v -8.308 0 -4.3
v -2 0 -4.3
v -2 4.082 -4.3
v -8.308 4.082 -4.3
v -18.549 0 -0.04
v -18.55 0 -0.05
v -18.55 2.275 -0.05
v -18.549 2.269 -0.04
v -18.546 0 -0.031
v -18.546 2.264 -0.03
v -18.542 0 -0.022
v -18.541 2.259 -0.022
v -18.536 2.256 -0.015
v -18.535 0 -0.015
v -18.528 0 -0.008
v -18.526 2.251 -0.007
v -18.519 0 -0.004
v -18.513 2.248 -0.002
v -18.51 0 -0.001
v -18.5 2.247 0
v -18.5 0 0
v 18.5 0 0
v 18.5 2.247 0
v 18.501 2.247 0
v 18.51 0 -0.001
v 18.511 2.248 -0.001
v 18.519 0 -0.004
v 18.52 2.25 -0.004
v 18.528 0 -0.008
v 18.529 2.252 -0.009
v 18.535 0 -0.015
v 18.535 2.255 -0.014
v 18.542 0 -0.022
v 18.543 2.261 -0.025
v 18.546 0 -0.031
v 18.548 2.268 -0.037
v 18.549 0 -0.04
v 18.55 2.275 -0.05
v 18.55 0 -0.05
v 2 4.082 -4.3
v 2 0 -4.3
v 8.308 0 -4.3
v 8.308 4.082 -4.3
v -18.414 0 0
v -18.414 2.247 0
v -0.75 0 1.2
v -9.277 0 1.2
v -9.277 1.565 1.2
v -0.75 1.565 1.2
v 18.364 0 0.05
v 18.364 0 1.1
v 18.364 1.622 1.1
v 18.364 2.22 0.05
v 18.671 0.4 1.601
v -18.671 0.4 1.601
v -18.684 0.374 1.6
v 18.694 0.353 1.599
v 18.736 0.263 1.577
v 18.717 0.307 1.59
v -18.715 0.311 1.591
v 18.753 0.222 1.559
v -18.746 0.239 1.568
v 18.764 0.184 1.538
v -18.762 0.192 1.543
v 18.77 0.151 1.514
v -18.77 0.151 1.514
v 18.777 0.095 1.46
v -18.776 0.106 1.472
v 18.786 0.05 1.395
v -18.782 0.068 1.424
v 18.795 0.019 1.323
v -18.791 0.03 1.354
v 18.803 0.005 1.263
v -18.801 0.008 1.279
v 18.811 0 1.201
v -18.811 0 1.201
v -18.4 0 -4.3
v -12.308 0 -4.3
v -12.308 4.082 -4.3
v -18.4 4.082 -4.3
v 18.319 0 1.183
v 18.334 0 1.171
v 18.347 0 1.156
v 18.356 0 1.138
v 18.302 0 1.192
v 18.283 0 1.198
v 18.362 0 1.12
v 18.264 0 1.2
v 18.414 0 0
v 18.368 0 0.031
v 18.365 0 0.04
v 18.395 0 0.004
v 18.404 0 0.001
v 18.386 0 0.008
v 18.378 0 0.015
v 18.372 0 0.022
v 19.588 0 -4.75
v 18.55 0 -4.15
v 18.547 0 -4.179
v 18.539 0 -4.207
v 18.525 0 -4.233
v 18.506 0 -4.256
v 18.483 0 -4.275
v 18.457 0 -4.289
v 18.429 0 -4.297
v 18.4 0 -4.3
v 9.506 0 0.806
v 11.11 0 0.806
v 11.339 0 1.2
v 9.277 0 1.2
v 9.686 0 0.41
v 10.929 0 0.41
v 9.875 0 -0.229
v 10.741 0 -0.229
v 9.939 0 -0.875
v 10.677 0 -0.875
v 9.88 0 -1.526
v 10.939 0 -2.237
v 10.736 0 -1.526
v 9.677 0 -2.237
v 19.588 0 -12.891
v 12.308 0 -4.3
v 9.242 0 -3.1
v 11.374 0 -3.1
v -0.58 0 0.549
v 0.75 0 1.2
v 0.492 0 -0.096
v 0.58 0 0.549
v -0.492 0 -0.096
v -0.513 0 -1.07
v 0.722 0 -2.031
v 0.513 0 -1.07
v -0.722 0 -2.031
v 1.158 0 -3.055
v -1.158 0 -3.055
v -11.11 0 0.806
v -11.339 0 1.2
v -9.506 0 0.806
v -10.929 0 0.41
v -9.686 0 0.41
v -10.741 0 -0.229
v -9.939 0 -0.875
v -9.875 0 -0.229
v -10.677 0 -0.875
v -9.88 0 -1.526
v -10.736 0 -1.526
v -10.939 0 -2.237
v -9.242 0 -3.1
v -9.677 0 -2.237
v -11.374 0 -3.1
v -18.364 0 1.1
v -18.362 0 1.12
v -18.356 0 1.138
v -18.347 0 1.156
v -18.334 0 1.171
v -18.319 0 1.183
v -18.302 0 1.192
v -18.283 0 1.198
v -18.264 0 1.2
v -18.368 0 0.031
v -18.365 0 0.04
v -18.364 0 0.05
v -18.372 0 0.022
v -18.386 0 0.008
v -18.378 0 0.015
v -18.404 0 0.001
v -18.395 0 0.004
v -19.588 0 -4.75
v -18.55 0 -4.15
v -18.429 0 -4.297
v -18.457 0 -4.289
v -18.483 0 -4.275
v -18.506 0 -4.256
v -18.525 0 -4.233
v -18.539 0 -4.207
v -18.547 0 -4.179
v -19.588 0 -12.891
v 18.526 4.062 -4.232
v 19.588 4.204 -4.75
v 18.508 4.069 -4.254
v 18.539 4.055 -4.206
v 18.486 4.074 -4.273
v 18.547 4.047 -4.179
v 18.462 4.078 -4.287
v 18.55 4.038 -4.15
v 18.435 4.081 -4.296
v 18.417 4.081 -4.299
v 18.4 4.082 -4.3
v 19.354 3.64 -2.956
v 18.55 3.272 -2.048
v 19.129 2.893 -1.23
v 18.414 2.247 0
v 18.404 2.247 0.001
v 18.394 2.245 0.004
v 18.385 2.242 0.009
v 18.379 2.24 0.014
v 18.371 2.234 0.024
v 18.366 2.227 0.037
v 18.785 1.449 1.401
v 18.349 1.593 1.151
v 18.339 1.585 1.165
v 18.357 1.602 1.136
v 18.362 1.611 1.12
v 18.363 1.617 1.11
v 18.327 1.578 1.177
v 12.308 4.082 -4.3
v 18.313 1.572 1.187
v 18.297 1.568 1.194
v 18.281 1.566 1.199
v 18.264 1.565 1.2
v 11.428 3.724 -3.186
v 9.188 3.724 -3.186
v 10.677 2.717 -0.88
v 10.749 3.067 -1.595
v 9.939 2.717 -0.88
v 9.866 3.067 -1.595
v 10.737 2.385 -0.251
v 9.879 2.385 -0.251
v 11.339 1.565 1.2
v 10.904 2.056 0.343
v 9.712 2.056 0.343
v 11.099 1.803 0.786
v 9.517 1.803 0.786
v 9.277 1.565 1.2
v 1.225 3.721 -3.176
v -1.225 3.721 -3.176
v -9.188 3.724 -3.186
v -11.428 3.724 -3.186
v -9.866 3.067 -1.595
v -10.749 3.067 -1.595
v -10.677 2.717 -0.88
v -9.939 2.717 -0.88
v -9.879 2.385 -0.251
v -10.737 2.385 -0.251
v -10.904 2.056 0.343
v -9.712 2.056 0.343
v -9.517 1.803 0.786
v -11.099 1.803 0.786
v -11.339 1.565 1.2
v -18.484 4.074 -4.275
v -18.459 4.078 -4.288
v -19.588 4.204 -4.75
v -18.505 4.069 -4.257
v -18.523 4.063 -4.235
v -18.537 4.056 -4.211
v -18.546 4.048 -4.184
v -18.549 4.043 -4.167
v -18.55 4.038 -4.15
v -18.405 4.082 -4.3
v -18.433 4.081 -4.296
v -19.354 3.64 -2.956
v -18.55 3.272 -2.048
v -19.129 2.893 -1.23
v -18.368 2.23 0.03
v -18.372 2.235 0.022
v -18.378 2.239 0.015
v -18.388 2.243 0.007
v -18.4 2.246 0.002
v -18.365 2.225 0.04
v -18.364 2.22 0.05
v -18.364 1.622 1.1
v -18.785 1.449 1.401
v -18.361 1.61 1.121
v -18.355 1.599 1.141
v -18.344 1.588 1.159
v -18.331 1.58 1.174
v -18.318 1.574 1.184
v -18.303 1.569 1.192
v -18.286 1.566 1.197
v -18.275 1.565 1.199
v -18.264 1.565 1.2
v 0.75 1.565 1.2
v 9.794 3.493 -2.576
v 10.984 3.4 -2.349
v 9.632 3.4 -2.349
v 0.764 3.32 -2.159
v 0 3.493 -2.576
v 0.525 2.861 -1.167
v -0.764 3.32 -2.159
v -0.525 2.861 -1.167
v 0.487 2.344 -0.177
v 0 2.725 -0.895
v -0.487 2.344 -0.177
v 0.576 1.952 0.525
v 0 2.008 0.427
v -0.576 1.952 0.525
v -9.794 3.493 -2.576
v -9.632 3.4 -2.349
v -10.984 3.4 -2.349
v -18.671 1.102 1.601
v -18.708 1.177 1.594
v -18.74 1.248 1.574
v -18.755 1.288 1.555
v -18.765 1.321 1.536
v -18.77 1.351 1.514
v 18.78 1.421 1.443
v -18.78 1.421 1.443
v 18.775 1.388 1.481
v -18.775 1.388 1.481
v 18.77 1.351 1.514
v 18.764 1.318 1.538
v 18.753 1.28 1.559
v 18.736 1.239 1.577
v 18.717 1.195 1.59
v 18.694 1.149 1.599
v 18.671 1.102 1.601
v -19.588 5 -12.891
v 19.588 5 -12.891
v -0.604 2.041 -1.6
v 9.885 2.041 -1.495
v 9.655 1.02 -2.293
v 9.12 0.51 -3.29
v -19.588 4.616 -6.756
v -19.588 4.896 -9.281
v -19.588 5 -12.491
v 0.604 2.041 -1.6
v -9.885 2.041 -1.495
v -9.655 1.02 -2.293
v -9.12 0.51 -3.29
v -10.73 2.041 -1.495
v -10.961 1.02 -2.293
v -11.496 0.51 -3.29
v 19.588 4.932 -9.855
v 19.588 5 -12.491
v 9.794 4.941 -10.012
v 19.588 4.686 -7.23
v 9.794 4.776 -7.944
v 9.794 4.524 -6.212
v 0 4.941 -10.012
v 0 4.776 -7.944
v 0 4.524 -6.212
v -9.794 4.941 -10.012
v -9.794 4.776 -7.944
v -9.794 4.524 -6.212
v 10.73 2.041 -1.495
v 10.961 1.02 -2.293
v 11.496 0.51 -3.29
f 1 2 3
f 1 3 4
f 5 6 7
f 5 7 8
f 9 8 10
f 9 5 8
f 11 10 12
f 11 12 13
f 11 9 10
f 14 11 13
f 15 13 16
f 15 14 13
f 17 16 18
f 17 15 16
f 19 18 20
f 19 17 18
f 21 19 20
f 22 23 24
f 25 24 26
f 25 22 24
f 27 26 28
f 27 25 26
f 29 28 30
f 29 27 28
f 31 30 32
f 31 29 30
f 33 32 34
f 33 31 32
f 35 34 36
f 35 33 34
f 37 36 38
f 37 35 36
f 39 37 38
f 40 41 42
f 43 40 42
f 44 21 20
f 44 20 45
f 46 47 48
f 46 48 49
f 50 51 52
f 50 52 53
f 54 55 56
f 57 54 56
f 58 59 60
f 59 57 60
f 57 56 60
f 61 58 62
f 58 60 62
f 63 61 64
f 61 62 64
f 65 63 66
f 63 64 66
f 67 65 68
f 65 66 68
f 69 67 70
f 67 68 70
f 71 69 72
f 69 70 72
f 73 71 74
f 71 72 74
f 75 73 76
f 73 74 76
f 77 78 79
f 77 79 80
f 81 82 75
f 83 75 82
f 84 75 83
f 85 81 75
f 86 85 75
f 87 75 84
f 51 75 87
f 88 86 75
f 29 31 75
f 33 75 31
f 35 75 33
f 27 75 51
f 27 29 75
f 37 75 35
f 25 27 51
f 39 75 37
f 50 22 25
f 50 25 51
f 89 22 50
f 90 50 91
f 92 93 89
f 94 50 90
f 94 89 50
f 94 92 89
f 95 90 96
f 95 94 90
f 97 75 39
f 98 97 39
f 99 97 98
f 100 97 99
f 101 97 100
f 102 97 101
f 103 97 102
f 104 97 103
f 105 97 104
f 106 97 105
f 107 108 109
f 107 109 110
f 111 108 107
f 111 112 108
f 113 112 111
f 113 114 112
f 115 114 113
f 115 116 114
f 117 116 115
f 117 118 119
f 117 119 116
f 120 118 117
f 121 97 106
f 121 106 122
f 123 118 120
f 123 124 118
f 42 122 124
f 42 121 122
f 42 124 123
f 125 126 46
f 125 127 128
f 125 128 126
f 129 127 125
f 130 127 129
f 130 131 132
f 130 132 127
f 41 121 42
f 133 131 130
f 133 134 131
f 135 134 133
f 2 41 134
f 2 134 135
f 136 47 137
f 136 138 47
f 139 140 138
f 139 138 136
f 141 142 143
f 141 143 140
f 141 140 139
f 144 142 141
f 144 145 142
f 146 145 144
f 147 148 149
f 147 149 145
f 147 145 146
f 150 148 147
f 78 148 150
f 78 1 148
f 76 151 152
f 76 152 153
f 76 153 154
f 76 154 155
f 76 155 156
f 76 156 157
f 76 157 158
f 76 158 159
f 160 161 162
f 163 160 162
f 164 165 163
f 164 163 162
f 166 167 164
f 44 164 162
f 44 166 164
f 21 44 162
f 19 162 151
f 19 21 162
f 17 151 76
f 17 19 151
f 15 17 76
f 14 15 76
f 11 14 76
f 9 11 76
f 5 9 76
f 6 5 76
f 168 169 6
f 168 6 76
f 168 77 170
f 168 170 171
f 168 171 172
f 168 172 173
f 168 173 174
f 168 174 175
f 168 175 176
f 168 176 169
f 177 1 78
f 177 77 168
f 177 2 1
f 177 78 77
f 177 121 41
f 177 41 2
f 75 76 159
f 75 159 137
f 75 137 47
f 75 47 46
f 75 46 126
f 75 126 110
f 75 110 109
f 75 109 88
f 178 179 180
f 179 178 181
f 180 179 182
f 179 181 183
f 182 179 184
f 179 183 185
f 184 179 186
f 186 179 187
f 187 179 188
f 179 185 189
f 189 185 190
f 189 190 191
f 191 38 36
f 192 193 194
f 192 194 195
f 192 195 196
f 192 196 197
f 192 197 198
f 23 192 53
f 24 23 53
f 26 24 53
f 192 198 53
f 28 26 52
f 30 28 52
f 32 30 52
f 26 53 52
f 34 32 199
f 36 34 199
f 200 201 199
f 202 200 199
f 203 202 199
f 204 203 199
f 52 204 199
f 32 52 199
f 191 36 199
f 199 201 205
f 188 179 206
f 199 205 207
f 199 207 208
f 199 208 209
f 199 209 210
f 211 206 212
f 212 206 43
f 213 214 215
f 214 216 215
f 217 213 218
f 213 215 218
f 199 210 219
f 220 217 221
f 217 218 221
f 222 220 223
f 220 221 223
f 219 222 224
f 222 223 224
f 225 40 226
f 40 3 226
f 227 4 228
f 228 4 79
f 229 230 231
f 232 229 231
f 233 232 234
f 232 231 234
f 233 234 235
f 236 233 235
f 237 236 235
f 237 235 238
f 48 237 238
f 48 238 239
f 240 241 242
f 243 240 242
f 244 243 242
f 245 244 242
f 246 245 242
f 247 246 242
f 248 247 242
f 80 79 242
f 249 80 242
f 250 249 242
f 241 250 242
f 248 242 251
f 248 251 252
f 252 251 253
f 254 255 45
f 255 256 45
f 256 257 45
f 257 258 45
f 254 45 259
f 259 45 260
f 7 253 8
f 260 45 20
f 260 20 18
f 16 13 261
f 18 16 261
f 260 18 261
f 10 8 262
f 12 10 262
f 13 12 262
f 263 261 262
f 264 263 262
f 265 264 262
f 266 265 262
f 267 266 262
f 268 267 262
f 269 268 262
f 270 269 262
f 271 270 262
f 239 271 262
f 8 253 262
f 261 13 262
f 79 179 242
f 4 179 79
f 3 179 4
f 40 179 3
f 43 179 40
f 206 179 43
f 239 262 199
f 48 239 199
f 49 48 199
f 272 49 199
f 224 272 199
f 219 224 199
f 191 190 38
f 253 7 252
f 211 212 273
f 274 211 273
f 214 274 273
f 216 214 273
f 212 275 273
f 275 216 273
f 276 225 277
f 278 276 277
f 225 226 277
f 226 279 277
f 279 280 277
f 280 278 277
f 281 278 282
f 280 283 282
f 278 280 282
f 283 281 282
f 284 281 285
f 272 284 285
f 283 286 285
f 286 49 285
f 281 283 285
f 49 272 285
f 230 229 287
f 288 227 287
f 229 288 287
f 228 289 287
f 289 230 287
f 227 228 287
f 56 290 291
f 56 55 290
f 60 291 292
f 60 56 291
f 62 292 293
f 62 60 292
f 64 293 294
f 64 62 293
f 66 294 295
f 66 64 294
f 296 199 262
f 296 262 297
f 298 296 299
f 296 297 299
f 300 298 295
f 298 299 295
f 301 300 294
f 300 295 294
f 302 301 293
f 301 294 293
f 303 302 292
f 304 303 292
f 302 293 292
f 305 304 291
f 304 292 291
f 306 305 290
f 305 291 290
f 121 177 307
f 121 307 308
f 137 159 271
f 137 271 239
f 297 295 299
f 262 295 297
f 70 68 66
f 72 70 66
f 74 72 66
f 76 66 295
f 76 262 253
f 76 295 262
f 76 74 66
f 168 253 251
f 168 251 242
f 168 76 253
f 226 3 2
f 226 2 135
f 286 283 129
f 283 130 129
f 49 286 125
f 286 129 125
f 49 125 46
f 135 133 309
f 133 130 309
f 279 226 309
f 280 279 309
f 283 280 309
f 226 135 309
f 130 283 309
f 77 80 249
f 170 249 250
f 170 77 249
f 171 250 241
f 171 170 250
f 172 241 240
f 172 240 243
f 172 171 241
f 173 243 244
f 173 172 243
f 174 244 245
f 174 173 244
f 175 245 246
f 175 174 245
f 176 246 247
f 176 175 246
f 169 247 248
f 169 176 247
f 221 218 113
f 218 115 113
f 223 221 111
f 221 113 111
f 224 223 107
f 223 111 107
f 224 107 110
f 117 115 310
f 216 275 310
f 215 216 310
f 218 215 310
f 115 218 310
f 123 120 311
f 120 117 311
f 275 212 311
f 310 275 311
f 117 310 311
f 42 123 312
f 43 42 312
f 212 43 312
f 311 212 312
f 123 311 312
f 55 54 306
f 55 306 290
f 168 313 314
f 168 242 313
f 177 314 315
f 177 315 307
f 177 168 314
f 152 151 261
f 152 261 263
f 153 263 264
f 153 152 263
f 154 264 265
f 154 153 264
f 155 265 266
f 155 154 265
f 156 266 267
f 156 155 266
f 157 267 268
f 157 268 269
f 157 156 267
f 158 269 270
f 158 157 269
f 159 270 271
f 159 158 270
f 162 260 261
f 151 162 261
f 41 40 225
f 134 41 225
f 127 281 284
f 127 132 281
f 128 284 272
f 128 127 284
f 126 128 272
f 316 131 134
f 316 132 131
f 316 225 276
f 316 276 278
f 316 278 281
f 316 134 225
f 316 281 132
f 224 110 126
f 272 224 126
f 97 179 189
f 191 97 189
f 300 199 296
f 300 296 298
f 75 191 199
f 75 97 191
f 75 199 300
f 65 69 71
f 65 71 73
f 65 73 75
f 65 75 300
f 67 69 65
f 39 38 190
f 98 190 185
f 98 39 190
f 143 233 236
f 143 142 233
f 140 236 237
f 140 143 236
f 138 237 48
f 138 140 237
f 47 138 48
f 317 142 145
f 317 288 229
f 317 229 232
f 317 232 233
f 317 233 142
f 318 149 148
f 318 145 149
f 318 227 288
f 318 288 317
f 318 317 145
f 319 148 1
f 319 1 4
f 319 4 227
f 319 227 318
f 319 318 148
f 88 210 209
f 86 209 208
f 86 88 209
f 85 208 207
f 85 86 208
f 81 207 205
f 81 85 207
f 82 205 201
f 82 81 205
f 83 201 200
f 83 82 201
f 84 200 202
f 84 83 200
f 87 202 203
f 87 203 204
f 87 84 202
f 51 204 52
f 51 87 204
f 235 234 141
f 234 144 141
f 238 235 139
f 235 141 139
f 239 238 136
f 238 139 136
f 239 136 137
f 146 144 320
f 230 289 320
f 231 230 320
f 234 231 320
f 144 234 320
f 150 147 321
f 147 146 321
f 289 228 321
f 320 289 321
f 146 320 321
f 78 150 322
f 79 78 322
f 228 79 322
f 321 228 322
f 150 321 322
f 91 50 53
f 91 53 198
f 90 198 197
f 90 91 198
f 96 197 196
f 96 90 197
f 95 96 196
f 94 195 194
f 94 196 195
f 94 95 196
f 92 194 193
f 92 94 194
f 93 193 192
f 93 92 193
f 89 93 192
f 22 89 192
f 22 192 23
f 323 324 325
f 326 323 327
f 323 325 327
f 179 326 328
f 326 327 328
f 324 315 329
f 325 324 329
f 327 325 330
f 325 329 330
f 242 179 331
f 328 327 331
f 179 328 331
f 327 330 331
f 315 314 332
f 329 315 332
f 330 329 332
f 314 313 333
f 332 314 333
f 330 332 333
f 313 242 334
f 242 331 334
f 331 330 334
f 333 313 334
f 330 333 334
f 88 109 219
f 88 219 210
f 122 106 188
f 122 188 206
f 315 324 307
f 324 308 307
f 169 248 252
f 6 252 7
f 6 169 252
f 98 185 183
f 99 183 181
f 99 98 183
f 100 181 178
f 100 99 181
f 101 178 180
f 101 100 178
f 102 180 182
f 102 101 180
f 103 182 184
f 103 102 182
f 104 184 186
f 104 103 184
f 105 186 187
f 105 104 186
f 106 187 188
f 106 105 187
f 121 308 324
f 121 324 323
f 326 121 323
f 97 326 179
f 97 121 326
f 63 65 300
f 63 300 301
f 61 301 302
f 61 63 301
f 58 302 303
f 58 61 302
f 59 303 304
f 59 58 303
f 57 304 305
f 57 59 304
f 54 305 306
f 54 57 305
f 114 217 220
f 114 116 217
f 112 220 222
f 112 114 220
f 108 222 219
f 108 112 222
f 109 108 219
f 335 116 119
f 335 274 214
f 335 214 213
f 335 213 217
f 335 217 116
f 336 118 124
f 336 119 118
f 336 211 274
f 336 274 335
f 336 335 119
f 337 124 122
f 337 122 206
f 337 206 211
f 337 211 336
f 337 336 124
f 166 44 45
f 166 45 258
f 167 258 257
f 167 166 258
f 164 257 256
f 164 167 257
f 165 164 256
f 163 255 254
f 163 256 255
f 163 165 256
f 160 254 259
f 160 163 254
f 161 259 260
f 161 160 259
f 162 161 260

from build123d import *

# Parameters (mm, degrees)
BOSS_EXTRUDE1_DEPTH = 5
SKETCH5_W           = 39.175778664
SKETCH5_H           = 11.134274613
CUT_REVOLVE3_ANGLE  = 30
CUT_EXTRUDE2_DEPTH  = 50


with BuildPart() as part:
    # Sketch2 → Boss-Extrude1 (new body)
    with BuildSketch(Plane(origin=(0, 0, 0), x_dir=(1, 0, 0), z_dir=(0, 1, 0))):
        with BuildLine():
            Line((-19.587889332, 4.75), (-19.587889332, 12.891151468))
            Line((-19.587889332, 12.891151468), (19.587889332, 12.891151468))
            Line((19.587889332, 12.891151468), (19.587889332, 4.75))
            Line((19.587889332, 4.75), (18.770336665, -1.514246746))
            ThreePointArc((18.770336665, -1.514246746), (18.737154352, -1.576452374), (18.671177592, -1.601305403))
            Line((18.671177592, -1.601305403), (-18.671177592, -1.601305403))
            ThreePointArc((-18.671177592, -1.601305403), (-18.737154352, -1.576452374), (-18.770336665, -1.514246746))
            Line((-18.770336665, -1.514246746), (-19.587889332, 4.75))
        make_face()
        with BuildLine():
            Line((18.41371442, 0), (18.5, 0))
            ThreePointArc((18.5, 0), (18.535355339, 0.014644661), (18.55, 0.05))
            Line((18.55, 0.05), (18.55, 4.15))
            ThreePointArc((18.55, 4.15), (18.506066017, 4.256066017), (18.4, 4.3))
            Line((18.4, 4.3), (12.307916791, 4.3))
            add(Edge.make_bspline(
                [(12.307916791, 4.3), (9.637425056, 1.440271055), (11.338639539, -1.2)],
                knots=[0, 0, 0, 1, 1, 1], degree=2))
            Line((11.338639539, -1.2), (18.26371442, -1.2))
            ThreePointArc((18.26371442, -1.2), (18.334425098, -1.170710678), (18.36371442, -1.1))
            Line((18.36371442, -1.1), (18.36371442, -0.05))
            ThreePointArc((18.36371442, -0.05), (18.378359081, -0.014644661), (18.41371442, 0))
        make_face(mode=Mode.SUBTRACT)
        with BuildLine():
            Line((-2, 4.3), (-8.307916791, 4.3))
            add(Edge.make_bspline(
                [(-8.307916791, 4.3), (-10.978408526, 1.440271055), (-9.277194043, -1.2)],
                knots=[0, 0, 0, 1, 1, 1], degree=2))
            Line((-9.277194043, -1.2), (-0.75, -1.2))
            add(Edge.make_bspline(
                [(-2, 4.3), (0.166282415, 1.650512873), (-0.75, -1.2)],
                knots=[0, 0, 0, 1, 1, 1], degree=2))
        make_face(mode=Mode.SUBTRACT)
        with BuildLine():
            Line((9.277194043, -1.2), (0.75, -1.2))
            add(Edge.make_bspline(
                [(2, 4.3), (-0.166282415, 1.650512873), (0.75, -1.2)],
                knots=[0, 0, 0, 1, 1, 1], degree=2))
            Line((2, 4.3), (8.307916791, 4.3))
            add(Edge.make_bspline(
                [(8.307916791, 4.3), (10.978408526, 1.440271055), (9.277194043, -1.2)],
                knots=[0, 0, 0, 1, 1, 1], degree=2))
        make_face(mode=Mode.SUBTRACT)
        with BuildLine():
            Line((-12.307916791, 4.3), (-18.4, 4.3))
            ThreePointArc((-18.4, 4.3), (-18.506066017, 4.256066017), (-18.55, 4.15))
            Line((-18.55, 4.15), (-18.55, 0.05))
            ThreePointArc((-18.55, 0.05), (-18.535355339, 0.014644661), (-18.5, 0))
            Line((-18.5, 0), (-18.41371442, 0))
            ThreePointArc((-18.41371442, 0), (-18.378359081, -0.014644661), (-18.36371442, -0.05))
            Line((-18.36371442, -0.05), (-18.36371442, -1.1))
            ThreePointArc((-18.36371442, -1.1), (-18.334425098, -1.170710678), (-18.26371442, -1.2))
            Line((-18.26371442, -1.2), (-11.338639539, -1.2))
            add(Edge.make_bspline(
                [(-12.307916791, 4.3), (-9.637425056, 1.440271055), (-11.338639539, -1.2)],
                knots=[0, 0, 0, 1, 1, 1], degree=2))
        make_face(mode=Mode.SUBTRACT)
    extrude(amount=BOSS_EXTRUDE1_DEPTH)

    # Sketch5 → Cut-Revolve3 (revolve, cut)
    with BuildSketch(Plane(origin=(0, 5, 0), x_dir=(1, 0, 0), z_dir=(0, 1, 0))):
        with Locations((0, -0.817137307)):
            Rectangle(SKETCH5_W, SKETCH5_H)
    revolve(axis=Axis((-19.587889332, 5, -4.75), (1, 0, 0)), revolution_arc=CUT_REVOLVE3_ANGLE, mode=Mode.SUBTRACT)

    # Sketch8 → Cut-Extrude2 (cut)
    with BuildSketch(Plane.ZY.offset(19.587889332)):
        Polygon((4.230476996, 7.111214782), (-14.213063749, 7.925673134), (-16.866621606, -3.135196744), (3.547382894, -3.844563695), align=None)
        with BuildLine():
            Line((-12.891151468, 0), (-12.891151468, 0.4))
            Line((-12.891151468, 0.4), (-12.891151468, 4.6))
            Line((-12.891151468, 4.6), (-12.891151468, 5))
            Line((-12.891151468, 5), (-12.491151468, 5))
            Line((-12.491151468, 5), (-4.75, 5))
            Line((-4.75, 5), (-4.75, 4.203963132))
            add(Edge.make_bspline(
                [(-4.75, 4.203963132), (-2.254573222, 3.559264678), (-0.743625983, 2.686918883), (0.627090158, 1.89553555), (1.401305403, 1.448542169)],
                knots=[0.350361042, 0.350361042, 0.350361042, 0.350361042, 0.350361042, 1, 1, 1, 1, 1], degree=4))
            ThreePointArc((1.401305403, 1.448542169), (1.547715565, 1.302132008), (1.601305403, 1.102132008))
            Line((1.601305403, 1.102132008), (1.601305403, 0.4))
            ThreePointArc((1.601305403, 0.4), (1.484148116, 0.117157288), (1.201305403, 0))
            Line((1.201305403, 0), (-4.75, 0))
            Line((-4.75, 0), (-12.491151468, 0))
            Line((-12.491151468, 0), (-12.891151468, 0))
        make_face(mode=Mode.SUBTRACT)
        with BuildLine():
            Line((-4.75, 5), (-12.491151468, 5))
            add(Edge.make_bspline(
                [(-12.491151468, 5), (-9.778953574, 5), (-7.727997949, 4.833142186), (-6.095824962, 4.551659678), (-4.75, 4.203963132)],
                knots=[0, 0, 0, 0, 0, 0.350361042, 0.350361042, 0.350361042, 0.350361042, 0.350361042], degree=4))
            Line((-4.75, 4.203963132), (-4.75, 5))
        make_face()
    extrude(amount=-CUT_EXTRUDE2_DEPTH, mode=Mode.SUBTRACT)


solid = part.part
